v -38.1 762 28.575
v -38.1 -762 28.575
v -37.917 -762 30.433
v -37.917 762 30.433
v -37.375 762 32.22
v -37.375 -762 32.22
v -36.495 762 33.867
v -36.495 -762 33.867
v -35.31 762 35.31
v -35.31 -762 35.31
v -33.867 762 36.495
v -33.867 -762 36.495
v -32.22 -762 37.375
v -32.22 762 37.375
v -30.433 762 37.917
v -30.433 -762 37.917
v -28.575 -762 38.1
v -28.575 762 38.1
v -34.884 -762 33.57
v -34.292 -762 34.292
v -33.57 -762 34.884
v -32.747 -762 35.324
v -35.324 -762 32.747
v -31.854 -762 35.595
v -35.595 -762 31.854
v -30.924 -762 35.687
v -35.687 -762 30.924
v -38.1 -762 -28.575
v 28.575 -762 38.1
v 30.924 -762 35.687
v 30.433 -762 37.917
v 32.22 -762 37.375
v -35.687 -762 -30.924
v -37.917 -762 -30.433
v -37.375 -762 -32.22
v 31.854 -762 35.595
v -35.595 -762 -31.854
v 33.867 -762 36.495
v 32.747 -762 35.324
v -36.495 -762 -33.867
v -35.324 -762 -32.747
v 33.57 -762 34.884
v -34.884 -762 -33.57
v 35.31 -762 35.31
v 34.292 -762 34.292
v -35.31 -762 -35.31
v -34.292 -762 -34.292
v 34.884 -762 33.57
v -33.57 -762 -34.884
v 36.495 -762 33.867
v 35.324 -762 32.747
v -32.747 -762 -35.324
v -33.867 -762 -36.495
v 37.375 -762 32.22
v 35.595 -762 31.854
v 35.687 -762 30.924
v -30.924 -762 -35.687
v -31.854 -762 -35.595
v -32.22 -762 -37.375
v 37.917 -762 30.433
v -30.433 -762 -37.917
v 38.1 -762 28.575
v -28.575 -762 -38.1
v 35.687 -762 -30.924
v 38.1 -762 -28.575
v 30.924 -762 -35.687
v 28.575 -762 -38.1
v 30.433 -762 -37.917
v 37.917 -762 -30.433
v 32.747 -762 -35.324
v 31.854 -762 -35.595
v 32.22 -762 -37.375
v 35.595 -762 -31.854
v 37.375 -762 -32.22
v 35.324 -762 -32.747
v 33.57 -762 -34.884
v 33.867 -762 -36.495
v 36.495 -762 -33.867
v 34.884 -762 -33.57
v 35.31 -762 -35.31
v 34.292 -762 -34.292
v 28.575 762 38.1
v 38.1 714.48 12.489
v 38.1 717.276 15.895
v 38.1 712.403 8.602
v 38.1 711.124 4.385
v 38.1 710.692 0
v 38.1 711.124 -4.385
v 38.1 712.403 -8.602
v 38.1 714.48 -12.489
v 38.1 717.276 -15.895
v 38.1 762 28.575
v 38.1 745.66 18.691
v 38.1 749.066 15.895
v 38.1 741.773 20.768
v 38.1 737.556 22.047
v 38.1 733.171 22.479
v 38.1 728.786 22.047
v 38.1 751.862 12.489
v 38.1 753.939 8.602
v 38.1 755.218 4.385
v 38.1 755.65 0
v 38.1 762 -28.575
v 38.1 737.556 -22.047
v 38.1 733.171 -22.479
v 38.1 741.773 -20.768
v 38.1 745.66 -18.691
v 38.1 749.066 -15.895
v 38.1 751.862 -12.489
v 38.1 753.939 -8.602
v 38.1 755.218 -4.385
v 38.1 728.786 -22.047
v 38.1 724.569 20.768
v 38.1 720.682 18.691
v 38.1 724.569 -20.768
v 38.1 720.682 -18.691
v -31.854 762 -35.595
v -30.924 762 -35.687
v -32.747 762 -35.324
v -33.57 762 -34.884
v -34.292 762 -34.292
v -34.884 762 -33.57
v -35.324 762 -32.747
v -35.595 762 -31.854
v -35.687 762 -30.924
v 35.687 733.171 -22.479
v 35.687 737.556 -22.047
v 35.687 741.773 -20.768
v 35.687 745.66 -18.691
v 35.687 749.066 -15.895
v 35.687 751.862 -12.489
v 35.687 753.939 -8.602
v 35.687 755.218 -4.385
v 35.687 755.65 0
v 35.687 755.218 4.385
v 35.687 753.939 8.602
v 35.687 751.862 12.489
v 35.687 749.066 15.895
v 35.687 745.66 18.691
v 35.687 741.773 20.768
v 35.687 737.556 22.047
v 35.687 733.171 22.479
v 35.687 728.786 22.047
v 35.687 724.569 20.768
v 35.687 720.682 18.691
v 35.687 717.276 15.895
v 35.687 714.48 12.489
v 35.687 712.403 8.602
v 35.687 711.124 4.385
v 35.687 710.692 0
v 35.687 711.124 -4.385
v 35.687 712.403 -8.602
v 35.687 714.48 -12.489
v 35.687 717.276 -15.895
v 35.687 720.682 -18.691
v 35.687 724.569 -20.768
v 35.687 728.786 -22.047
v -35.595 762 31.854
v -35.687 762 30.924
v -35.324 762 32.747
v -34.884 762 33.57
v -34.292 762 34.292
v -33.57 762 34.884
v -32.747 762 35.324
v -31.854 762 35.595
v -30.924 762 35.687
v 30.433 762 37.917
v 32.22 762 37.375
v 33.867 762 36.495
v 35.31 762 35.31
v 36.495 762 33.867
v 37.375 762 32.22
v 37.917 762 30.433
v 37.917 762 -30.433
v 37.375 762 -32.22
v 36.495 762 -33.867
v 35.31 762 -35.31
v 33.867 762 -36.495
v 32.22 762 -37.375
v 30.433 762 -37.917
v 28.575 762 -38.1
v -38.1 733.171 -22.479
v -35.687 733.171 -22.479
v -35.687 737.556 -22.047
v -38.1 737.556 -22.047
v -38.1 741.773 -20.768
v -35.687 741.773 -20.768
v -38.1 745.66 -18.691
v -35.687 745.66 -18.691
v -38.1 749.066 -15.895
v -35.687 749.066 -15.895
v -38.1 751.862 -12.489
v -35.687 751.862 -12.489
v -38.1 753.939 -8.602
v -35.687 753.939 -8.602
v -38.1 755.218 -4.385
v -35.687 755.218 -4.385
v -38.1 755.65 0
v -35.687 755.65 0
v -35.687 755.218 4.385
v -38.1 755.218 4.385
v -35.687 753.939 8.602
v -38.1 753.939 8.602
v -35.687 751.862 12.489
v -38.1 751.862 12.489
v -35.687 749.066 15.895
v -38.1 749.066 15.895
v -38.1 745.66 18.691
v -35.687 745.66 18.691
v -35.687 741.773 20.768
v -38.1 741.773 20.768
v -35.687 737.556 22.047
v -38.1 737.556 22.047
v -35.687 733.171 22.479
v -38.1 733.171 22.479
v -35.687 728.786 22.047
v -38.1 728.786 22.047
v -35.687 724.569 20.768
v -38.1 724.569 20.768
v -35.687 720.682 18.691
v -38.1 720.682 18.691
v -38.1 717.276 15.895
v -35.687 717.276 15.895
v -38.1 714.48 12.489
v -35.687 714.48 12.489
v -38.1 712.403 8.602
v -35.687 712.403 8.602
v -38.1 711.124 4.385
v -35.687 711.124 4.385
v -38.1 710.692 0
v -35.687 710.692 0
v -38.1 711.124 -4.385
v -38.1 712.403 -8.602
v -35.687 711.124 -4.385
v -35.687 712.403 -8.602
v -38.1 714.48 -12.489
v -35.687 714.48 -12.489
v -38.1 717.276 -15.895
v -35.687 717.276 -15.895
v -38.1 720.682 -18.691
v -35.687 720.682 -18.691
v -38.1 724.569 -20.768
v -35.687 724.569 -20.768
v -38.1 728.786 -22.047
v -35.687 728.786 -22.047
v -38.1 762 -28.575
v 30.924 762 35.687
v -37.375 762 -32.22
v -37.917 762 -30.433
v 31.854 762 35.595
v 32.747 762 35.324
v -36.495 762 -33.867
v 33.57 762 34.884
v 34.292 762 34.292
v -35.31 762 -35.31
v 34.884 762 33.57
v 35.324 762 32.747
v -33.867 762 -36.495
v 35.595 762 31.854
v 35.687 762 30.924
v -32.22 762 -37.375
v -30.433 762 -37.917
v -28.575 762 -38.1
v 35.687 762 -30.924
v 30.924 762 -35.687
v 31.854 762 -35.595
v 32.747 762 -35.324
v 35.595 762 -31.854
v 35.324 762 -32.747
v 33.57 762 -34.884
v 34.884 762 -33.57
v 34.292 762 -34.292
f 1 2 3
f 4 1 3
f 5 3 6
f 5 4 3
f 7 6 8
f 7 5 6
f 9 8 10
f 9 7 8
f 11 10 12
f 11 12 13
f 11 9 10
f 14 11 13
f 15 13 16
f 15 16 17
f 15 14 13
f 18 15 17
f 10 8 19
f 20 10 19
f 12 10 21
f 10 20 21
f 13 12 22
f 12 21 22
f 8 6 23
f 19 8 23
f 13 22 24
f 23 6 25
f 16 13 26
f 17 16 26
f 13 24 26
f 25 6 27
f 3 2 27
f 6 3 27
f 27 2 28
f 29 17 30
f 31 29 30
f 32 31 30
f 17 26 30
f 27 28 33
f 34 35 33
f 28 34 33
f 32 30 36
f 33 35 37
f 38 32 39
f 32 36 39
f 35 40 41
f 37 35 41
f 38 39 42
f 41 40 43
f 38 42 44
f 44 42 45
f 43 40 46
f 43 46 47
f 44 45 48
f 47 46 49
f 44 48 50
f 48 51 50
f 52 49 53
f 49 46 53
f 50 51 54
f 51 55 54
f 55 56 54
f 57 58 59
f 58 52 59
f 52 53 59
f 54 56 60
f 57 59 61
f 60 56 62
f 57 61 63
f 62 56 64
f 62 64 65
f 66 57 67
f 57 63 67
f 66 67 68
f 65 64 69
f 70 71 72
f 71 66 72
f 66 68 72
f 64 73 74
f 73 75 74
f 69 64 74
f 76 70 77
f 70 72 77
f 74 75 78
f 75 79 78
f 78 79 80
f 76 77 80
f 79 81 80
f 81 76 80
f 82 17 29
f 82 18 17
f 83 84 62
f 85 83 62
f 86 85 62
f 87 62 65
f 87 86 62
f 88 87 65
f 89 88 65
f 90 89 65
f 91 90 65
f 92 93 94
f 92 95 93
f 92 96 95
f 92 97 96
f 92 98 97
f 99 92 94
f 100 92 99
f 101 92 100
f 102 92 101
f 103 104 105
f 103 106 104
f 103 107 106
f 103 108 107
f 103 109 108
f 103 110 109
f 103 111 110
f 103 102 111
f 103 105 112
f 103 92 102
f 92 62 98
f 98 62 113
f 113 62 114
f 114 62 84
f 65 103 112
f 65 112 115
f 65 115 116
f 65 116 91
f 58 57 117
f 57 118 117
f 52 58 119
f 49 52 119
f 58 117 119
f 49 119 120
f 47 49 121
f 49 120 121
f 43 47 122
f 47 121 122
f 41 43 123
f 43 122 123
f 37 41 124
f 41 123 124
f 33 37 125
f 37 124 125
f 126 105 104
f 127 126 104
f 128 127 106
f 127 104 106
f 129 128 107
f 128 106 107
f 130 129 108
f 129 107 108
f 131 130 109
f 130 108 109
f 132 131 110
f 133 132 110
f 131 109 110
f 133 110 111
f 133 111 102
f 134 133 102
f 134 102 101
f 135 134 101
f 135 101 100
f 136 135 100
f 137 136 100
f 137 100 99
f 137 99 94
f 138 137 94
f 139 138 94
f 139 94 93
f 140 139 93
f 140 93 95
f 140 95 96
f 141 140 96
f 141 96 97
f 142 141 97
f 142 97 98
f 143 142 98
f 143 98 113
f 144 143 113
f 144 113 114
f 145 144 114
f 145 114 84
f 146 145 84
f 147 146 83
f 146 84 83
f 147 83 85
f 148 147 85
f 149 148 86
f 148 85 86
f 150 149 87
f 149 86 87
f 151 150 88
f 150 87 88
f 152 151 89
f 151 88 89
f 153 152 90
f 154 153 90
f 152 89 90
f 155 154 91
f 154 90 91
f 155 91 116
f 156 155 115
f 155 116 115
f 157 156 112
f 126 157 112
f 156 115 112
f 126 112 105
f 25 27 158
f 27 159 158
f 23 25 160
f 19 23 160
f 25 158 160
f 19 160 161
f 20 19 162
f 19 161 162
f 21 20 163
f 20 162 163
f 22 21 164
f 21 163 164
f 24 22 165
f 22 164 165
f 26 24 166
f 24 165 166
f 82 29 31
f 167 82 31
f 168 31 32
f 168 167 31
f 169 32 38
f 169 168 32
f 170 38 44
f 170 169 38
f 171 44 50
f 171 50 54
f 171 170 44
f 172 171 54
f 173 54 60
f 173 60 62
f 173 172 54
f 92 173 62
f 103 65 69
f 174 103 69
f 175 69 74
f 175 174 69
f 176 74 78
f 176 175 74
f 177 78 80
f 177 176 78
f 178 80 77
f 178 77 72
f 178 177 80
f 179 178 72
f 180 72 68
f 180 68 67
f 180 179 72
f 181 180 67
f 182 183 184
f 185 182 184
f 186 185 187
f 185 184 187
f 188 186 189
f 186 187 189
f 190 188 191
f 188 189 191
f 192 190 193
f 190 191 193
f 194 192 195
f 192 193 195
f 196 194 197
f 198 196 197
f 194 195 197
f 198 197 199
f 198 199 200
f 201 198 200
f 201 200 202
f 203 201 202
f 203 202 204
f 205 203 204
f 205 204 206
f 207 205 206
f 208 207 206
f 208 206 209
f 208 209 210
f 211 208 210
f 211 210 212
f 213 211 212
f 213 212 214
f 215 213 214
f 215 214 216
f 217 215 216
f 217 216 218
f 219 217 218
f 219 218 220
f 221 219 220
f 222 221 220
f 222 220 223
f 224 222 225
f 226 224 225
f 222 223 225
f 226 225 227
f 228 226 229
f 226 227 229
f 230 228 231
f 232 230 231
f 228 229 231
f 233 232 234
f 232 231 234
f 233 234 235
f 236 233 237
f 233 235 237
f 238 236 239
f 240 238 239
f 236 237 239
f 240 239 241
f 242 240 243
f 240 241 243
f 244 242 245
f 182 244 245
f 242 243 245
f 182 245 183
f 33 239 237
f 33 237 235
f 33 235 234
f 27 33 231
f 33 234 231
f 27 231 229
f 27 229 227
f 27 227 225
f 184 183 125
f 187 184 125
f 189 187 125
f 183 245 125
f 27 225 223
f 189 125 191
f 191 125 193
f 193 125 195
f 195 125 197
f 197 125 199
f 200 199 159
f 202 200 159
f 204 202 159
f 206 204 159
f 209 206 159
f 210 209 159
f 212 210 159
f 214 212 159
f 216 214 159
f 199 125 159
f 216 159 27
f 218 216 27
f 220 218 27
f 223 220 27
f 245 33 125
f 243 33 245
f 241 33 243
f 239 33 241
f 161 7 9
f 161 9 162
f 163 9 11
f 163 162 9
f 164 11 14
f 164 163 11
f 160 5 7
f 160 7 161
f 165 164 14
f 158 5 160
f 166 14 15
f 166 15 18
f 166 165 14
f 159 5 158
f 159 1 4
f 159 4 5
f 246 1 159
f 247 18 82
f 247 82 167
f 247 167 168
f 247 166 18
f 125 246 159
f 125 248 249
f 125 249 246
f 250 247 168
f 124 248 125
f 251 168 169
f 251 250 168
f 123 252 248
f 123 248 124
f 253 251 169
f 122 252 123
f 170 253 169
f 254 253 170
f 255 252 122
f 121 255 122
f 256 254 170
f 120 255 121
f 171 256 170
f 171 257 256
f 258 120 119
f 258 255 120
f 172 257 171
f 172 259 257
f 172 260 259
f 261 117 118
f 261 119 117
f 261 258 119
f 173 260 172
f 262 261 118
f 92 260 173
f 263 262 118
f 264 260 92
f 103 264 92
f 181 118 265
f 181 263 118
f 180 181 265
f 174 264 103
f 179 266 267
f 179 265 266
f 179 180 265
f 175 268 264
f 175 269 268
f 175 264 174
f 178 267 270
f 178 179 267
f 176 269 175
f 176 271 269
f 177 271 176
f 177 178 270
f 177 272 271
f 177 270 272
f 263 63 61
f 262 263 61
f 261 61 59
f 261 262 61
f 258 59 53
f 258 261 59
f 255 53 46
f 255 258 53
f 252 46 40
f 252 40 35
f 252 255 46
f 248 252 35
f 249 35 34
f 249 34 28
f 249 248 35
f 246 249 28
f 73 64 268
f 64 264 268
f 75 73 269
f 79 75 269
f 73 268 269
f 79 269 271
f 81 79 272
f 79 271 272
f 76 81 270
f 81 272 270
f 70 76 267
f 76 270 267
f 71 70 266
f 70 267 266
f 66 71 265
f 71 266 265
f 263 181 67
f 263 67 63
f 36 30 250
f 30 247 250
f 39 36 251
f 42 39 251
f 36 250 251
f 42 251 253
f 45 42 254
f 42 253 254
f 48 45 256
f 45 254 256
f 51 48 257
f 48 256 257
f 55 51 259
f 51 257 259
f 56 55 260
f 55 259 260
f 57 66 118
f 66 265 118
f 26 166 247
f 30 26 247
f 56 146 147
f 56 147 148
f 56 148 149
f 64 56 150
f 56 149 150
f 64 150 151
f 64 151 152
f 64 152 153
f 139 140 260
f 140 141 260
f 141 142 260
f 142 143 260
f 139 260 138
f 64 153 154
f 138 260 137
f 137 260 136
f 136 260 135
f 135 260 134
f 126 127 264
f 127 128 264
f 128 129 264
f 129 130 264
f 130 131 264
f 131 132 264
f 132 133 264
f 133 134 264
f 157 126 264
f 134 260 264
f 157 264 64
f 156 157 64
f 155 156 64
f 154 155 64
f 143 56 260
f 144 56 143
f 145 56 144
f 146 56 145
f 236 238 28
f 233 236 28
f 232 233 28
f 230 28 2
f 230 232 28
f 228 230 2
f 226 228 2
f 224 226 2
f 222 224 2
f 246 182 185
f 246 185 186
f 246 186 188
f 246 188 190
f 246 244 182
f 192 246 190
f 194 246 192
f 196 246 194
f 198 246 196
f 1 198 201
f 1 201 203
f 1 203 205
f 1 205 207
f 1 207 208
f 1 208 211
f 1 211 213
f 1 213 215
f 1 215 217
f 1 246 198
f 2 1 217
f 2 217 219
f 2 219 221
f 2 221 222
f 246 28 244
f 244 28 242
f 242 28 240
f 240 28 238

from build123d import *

# Parameters (mm, degrees)
BOSS_EXTRUDE1_DEPTH = 762
SKETCH2_R           = 22.479
CUT_EXTRUDE1_DEPTH  = 77.2


with BuildPart() as part:
    # Sketch1 → Boss-Extrude1 (new body, symmetric)
    with BuildSketch(Plane(origin=(0, 0, 0), x_dir=(1, 0, 0), z_dir=(0, 1, 0))):
        with BuildLine():
            Line((-28.575, -38.1), (28.575, -38.1))
            ThreePointArc((28.575, -38.1), (35.310192091, -35.310192091), (38.1, -28.575))
            Line((38.1, -28.575), (38.1, 28.575))
            ThreePointArc((38.1, 28.575), (35.310192091, 35.310192091), (28.575, 38.1))
            Line((28.575, 38.1), (-28.575, 38.1))
            ThreePointArc((-28.575, 38.1), (-35.310192091, 35.310192091), (-38.1, 28.575))
            Line((-38.1, 28.575), (-38.1, -28.575))
            ThreePointArc((-38.1, -28.575), (-35.310192091, -35.310192091), (-28.575, -38.1))
        make_face()
        with BuildLine():
            Line((-30.9245, -35.687), (30.9245, -35.687))
            ThreePointArc((30.9245, -35.687), (34.292096045, -34.292096045), (35.687, -30.9245))
            Line((35.687, -30.9245), (35.687, 30.9245))
            ThreePointArc((35.687, 30.9245), (34.292096045, 34.292096045), (30.9245, 35.687))
            Line((30.9245, 35.687), (-30.9245, 35.687))
            ThreePointArc((-30.9245, 35.687), (-34.292096045, 34.292096045), (-35.687, 30.9245))
            Line((-35.687, 30.9245), (-35.687, -30.9245))
            ThreePointArc((-35.687, -30.9245), (-34.292096045, -34.292096045), (-30.9245, -35.687))
        make_face(mode=Mode.SUBTRACT)
    extrude(amount=BOSS_EXTRUDE1_DEPTH, both=True)

    # Sketch2 → Cut-Extrude1 (cut, through all)
    with BuildSketch(Plane(origin=(38.1, 0, 0), x_dir=(0, 0, -1), z_dir=(1, 0, 0))):
        with Locations((0, 733.171)):
            Circle(SKETCH2_R)
    extrude(amount=-CUT_EXTRUDE1_DEPTH, mode=Mode.SUBTRACT)


solid = part.part
